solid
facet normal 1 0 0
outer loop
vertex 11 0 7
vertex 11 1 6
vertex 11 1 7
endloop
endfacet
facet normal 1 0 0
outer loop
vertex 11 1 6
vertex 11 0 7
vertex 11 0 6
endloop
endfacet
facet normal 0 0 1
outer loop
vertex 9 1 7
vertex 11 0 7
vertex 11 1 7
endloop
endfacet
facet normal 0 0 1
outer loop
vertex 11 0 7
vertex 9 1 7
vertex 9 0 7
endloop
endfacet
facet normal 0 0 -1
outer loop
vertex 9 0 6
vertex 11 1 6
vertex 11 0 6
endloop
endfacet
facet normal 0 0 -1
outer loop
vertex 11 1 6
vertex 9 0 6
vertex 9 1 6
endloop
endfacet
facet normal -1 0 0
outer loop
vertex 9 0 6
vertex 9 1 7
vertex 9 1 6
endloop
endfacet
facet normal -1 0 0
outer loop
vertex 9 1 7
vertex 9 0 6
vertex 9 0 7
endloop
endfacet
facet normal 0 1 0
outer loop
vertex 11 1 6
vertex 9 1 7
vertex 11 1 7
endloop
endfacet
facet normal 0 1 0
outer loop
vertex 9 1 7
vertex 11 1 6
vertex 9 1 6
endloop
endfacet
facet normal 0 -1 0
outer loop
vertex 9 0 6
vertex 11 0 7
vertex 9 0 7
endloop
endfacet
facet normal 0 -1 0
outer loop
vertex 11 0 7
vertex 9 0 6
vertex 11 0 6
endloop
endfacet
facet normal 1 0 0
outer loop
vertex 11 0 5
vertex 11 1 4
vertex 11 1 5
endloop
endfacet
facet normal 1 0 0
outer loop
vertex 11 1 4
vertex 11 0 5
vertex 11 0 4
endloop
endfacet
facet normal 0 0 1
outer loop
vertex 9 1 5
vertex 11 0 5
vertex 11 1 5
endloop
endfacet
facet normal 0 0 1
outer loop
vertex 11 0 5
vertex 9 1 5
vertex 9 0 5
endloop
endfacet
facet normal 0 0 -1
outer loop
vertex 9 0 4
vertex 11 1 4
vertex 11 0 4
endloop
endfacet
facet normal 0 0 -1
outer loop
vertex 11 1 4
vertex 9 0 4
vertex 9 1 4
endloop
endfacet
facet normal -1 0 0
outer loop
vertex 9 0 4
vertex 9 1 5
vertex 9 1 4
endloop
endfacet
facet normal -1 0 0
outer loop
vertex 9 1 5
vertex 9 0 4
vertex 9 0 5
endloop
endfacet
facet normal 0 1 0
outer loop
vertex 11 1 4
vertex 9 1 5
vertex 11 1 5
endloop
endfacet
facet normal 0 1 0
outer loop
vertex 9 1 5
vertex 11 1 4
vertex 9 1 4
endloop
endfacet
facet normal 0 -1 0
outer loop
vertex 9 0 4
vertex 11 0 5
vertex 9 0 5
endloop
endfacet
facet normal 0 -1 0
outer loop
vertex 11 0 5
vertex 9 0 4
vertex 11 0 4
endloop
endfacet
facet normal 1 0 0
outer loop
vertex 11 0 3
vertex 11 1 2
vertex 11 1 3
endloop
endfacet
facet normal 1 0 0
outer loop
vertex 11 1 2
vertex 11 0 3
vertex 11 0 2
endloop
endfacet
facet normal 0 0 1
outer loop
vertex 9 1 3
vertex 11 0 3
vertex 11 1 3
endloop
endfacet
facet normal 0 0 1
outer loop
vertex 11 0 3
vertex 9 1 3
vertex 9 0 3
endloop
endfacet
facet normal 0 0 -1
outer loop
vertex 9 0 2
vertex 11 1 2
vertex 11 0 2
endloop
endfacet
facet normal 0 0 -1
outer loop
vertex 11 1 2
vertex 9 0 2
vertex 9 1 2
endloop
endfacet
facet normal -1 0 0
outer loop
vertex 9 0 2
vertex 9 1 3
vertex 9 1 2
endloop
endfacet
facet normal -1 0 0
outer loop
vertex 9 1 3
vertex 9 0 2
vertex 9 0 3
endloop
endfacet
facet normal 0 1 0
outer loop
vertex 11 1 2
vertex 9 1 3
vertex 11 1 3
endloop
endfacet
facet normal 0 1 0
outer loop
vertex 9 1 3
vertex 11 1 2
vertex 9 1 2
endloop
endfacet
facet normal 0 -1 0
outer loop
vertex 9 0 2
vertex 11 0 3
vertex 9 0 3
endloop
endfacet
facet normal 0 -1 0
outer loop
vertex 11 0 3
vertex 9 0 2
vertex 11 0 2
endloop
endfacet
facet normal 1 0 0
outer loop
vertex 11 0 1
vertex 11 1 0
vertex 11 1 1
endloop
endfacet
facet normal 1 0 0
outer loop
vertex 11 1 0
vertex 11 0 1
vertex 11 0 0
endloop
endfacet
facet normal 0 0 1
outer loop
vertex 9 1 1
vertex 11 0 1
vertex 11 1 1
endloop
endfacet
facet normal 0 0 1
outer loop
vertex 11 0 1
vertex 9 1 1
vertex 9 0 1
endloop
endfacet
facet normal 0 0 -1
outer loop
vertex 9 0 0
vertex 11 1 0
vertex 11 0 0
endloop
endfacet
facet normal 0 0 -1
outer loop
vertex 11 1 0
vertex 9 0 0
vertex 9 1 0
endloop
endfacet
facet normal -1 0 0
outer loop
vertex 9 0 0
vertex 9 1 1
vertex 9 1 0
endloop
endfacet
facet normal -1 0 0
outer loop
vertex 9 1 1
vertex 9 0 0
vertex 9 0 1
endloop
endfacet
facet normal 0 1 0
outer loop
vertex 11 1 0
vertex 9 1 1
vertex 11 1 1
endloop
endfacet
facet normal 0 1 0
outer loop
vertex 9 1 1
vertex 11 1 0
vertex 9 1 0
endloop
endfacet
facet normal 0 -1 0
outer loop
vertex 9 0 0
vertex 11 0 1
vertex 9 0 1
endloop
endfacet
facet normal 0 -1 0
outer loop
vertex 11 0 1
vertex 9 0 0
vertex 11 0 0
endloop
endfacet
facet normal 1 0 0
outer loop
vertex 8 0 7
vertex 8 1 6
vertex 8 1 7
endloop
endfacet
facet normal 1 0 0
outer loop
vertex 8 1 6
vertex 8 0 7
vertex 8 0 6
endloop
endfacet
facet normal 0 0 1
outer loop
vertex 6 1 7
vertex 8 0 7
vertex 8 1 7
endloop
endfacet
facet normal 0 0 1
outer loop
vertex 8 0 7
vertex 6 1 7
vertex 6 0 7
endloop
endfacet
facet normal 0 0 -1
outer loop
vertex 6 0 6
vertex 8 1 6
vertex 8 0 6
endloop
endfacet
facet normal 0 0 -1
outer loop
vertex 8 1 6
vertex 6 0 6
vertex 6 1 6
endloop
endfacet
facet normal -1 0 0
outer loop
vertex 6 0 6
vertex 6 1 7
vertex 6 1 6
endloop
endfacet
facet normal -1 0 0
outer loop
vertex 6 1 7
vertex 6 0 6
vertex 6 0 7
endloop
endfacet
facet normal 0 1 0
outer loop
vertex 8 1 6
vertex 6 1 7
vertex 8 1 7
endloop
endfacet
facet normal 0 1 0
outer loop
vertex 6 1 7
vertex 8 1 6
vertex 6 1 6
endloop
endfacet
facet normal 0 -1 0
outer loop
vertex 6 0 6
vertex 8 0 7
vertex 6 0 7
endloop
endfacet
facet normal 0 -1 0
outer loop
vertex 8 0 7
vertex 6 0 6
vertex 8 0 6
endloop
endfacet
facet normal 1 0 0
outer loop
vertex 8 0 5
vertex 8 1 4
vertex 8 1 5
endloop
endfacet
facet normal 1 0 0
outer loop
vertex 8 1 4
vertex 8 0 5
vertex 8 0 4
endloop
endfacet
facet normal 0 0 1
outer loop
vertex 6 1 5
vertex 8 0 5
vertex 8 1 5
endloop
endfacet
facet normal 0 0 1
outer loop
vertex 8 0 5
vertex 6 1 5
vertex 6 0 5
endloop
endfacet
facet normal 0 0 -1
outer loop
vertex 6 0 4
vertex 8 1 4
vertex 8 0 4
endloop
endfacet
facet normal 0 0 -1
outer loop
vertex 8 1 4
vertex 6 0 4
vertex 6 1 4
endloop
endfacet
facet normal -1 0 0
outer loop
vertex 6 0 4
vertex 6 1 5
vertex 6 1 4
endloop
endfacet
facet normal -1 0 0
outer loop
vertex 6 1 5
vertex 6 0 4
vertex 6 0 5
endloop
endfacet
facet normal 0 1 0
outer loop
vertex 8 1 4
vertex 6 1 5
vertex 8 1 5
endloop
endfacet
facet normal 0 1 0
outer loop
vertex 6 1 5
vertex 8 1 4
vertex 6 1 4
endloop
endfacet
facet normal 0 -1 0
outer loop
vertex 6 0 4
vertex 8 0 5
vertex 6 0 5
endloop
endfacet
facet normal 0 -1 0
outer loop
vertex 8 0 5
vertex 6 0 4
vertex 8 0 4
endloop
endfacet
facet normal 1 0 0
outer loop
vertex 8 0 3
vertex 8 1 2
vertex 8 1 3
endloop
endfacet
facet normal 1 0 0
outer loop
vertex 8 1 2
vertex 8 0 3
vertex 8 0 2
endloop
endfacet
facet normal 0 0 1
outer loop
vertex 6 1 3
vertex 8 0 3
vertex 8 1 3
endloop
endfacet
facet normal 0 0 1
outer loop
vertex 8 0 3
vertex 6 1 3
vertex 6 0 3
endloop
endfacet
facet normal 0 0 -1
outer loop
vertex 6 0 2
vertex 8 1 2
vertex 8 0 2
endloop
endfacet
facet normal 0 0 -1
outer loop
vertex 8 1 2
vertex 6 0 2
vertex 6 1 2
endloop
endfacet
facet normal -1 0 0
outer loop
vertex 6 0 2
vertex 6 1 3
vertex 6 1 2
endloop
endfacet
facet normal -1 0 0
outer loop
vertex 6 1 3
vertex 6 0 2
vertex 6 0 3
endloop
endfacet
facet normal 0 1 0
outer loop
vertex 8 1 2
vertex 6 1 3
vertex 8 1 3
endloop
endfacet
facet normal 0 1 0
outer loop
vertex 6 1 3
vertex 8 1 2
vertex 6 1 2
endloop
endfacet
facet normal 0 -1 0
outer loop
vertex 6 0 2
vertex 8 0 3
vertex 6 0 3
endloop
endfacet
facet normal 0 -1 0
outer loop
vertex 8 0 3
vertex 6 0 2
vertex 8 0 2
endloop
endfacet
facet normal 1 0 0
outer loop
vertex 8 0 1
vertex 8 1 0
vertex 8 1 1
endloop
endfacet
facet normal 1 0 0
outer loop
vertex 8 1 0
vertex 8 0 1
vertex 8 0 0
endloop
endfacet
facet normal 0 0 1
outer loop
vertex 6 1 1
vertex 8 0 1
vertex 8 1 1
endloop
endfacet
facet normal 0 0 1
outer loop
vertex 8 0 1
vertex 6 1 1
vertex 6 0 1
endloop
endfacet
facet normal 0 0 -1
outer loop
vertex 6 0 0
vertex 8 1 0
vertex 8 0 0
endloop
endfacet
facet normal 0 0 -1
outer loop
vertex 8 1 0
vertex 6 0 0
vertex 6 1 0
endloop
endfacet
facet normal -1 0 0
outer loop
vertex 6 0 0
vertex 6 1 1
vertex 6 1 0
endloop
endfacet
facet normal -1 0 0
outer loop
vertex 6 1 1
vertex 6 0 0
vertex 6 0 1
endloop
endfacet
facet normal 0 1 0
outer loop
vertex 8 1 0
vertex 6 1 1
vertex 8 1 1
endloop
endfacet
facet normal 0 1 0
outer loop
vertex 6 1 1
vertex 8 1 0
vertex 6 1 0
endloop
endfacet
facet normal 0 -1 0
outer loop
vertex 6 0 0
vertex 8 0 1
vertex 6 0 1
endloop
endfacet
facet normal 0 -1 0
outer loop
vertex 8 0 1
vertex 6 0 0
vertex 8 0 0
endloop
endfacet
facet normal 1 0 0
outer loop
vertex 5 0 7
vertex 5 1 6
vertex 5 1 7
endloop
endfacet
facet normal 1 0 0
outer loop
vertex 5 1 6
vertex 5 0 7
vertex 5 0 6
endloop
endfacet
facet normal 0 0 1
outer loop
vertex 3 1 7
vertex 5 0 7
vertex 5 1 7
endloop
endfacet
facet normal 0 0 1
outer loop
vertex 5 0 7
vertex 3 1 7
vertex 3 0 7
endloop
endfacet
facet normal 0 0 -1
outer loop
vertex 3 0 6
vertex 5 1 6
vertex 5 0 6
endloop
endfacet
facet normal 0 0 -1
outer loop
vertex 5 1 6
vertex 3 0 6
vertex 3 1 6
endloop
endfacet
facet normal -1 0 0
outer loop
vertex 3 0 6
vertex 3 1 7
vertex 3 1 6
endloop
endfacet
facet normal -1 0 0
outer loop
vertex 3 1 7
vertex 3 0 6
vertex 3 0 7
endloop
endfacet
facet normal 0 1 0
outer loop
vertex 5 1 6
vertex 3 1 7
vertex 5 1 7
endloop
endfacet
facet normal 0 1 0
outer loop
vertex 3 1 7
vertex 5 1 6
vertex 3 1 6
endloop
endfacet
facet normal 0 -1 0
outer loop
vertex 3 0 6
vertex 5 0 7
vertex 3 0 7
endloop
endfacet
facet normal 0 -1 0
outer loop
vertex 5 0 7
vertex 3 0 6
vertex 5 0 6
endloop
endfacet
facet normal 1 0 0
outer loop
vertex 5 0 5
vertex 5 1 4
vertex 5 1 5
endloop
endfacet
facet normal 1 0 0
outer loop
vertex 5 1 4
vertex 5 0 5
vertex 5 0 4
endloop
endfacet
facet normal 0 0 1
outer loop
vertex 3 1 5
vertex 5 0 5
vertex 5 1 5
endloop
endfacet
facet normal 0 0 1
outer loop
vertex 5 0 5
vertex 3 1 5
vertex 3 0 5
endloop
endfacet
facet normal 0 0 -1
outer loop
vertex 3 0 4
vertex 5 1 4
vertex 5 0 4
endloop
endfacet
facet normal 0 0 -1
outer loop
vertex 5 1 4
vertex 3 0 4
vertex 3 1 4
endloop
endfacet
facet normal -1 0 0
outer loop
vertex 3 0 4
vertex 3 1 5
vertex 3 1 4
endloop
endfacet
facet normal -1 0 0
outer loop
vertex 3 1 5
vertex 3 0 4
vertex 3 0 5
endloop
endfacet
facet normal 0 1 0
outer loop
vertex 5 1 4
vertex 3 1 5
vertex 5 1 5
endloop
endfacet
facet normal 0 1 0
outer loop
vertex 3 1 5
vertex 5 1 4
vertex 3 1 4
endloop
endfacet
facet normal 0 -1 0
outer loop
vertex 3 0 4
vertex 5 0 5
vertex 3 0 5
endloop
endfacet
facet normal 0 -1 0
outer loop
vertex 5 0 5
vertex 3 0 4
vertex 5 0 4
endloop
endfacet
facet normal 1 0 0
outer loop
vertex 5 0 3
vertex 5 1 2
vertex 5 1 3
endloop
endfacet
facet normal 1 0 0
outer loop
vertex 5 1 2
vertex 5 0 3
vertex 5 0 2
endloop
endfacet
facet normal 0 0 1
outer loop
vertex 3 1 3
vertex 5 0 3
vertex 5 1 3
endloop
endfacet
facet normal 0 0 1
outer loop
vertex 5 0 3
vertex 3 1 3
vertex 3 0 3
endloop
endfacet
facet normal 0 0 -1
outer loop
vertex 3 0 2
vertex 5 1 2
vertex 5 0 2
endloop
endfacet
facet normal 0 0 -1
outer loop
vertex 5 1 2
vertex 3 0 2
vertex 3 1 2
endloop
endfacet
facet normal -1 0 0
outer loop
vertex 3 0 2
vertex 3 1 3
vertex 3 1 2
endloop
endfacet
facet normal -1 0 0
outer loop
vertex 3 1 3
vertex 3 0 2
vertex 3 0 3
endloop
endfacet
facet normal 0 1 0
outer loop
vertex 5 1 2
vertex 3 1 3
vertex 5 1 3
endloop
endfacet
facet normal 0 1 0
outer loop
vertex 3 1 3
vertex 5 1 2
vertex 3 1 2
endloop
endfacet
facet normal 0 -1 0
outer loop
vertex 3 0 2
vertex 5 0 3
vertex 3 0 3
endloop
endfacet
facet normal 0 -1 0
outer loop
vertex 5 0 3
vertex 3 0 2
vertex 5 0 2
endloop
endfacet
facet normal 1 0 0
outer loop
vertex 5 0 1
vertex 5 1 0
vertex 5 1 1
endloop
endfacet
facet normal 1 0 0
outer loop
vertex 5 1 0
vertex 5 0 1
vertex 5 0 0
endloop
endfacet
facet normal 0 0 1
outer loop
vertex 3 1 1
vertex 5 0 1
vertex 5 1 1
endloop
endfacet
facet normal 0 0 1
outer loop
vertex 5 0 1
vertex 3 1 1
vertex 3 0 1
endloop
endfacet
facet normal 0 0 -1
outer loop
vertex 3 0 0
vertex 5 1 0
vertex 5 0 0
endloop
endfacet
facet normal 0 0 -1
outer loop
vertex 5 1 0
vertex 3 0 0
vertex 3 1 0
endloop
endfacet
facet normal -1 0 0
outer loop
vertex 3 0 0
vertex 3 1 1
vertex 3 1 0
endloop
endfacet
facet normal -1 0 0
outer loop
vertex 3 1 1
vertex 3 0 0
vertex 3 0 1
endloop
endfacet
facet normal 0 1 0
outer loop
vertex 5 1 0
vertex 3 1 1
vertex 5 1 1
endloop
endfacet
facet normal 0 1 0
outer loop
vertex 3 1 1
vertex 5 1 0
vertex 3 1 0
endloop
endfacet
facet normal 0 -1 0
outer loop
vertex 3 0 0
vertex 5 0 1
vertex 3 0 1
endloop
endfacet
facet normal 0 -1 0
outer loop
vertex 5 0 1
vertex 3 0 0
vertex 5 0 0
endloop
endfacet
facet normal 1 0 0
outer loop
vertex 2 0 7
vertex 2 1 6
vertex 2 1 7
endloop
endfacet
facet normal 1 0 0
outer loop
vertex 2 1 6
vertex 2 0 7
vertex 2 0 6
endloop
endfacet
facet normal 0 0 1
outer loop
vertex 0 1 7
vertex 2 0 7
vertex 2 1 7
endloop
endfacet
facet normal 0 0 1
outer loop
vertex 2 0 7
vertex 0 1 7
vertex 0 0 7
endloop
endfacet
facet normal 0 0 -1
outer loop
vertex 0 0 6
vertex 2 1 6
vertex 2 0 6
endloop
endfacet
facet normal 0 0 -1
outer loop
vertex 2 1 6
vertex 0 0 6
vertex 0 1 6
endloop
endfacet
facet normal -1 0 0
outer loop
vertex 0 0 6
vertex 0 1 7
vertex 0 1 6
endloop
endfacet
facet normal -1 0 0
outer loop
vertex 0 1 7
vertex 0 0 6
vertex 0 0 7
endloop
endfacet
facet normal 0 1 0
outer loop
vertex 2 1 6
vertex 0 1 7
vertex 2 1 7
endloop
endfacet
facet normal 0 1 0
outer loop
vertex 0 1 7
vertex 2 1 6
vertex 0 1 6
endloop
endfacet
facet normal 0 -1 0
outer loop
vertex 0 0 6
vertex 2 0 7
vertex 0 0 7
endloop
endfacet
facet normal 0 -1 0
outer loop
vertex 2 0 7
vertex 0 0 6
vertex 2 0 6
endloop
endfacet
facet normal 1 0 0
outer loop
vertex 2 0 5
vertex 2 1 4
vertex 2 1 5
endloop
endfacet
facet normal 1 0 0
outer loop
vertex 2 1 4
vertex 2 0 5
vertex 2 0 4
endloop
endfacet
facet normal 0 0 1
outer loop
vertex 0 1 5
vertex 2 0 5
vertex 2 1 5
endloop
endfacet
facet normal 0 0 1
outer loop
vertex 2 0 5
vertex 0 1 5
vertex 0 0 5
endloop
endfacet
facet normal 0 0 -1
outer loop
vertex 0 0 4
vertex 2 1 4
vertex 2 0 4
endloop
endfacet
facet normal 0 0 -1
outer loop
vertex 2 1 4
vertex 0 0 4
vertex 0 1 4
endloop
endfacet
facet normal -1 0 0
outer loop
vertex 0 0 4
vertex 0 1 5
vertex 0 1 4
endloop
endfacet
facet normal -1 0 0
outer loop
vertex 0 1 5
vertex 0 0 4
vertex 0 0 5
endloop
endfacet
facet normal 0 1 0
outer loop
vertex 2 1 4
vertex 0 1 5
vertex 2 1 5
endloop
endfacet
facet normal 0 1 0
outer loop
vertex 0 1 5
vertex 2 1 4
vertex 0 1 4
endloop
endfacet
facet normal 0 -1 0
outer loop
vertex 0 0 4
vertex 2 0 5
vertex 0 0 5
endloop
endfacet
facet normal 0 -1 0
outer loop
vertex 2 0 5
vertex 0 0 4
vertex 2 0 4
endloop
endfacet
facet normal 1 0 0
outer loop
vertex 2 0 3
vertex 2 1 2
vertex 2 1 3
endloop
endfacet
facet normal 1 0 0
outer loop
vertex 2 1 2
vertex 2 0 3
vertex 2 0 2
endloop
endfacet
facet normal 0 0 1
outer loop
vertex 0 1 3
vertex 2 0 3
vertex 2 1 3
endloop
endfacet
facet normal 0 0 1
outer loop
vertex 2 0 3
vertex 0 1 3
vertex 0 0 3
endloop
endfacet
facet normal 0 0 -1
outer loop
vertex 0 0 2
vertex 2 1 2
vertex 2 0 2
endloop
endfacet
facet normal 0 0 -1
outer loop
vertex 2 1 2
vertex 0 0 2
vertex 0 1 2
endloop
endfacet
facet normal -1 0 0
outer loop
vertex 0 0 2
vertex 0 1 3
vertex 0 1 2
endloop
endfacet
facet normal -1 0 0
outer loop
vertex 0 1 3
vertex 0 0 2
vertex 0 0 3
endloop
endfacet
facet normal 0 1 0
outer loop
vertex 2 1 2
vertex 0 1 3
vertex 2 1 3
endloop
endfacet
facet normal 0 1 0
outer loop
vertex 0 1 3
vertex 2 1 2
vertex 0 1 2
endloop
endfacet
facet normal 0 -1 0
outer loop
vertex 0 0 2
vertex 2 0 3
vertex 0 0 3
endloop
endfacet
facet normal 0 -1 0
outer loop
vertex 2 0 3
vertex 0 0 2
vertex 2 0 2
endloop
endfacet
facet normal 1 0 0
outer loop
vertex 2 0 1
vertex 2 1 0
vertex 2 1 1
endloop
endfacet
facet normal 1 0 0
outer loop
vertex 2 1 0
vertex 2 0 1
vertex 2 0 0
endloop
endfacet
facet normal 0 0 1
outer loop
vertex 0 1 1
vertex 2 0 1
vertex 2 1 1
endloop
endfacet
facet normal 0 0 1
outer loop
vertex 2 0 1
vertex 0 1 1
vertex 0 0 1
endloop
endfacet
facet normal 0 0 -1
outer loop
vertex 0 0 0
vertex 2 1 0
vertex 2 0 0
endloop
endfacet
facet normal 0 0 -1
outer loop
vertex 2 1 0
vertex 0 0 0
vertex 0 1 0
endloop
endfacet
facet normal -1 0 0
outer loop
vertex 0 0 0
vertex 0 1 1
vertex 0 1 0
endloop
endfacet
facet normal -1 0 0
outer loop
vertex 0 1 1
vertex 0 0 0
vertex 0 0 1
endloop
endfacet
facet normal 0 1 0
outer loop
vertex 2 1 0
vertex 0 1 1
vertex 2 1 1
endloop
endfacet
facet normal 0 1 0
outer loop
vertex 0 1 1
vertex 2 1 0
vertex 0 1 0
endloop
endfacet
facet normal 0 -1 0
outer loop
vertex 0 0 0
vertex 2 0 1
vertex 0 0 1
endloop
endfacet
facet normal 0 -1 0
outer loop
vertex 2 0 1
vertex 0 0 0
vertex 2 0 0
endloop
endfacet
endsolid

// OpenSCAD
for(i = [0:3]) {
    for(j = [0:3]) {
        translate([-3 * i + 9, 0, -2 * j + 6])
            cube([2, 1, 1]);
    }
}
